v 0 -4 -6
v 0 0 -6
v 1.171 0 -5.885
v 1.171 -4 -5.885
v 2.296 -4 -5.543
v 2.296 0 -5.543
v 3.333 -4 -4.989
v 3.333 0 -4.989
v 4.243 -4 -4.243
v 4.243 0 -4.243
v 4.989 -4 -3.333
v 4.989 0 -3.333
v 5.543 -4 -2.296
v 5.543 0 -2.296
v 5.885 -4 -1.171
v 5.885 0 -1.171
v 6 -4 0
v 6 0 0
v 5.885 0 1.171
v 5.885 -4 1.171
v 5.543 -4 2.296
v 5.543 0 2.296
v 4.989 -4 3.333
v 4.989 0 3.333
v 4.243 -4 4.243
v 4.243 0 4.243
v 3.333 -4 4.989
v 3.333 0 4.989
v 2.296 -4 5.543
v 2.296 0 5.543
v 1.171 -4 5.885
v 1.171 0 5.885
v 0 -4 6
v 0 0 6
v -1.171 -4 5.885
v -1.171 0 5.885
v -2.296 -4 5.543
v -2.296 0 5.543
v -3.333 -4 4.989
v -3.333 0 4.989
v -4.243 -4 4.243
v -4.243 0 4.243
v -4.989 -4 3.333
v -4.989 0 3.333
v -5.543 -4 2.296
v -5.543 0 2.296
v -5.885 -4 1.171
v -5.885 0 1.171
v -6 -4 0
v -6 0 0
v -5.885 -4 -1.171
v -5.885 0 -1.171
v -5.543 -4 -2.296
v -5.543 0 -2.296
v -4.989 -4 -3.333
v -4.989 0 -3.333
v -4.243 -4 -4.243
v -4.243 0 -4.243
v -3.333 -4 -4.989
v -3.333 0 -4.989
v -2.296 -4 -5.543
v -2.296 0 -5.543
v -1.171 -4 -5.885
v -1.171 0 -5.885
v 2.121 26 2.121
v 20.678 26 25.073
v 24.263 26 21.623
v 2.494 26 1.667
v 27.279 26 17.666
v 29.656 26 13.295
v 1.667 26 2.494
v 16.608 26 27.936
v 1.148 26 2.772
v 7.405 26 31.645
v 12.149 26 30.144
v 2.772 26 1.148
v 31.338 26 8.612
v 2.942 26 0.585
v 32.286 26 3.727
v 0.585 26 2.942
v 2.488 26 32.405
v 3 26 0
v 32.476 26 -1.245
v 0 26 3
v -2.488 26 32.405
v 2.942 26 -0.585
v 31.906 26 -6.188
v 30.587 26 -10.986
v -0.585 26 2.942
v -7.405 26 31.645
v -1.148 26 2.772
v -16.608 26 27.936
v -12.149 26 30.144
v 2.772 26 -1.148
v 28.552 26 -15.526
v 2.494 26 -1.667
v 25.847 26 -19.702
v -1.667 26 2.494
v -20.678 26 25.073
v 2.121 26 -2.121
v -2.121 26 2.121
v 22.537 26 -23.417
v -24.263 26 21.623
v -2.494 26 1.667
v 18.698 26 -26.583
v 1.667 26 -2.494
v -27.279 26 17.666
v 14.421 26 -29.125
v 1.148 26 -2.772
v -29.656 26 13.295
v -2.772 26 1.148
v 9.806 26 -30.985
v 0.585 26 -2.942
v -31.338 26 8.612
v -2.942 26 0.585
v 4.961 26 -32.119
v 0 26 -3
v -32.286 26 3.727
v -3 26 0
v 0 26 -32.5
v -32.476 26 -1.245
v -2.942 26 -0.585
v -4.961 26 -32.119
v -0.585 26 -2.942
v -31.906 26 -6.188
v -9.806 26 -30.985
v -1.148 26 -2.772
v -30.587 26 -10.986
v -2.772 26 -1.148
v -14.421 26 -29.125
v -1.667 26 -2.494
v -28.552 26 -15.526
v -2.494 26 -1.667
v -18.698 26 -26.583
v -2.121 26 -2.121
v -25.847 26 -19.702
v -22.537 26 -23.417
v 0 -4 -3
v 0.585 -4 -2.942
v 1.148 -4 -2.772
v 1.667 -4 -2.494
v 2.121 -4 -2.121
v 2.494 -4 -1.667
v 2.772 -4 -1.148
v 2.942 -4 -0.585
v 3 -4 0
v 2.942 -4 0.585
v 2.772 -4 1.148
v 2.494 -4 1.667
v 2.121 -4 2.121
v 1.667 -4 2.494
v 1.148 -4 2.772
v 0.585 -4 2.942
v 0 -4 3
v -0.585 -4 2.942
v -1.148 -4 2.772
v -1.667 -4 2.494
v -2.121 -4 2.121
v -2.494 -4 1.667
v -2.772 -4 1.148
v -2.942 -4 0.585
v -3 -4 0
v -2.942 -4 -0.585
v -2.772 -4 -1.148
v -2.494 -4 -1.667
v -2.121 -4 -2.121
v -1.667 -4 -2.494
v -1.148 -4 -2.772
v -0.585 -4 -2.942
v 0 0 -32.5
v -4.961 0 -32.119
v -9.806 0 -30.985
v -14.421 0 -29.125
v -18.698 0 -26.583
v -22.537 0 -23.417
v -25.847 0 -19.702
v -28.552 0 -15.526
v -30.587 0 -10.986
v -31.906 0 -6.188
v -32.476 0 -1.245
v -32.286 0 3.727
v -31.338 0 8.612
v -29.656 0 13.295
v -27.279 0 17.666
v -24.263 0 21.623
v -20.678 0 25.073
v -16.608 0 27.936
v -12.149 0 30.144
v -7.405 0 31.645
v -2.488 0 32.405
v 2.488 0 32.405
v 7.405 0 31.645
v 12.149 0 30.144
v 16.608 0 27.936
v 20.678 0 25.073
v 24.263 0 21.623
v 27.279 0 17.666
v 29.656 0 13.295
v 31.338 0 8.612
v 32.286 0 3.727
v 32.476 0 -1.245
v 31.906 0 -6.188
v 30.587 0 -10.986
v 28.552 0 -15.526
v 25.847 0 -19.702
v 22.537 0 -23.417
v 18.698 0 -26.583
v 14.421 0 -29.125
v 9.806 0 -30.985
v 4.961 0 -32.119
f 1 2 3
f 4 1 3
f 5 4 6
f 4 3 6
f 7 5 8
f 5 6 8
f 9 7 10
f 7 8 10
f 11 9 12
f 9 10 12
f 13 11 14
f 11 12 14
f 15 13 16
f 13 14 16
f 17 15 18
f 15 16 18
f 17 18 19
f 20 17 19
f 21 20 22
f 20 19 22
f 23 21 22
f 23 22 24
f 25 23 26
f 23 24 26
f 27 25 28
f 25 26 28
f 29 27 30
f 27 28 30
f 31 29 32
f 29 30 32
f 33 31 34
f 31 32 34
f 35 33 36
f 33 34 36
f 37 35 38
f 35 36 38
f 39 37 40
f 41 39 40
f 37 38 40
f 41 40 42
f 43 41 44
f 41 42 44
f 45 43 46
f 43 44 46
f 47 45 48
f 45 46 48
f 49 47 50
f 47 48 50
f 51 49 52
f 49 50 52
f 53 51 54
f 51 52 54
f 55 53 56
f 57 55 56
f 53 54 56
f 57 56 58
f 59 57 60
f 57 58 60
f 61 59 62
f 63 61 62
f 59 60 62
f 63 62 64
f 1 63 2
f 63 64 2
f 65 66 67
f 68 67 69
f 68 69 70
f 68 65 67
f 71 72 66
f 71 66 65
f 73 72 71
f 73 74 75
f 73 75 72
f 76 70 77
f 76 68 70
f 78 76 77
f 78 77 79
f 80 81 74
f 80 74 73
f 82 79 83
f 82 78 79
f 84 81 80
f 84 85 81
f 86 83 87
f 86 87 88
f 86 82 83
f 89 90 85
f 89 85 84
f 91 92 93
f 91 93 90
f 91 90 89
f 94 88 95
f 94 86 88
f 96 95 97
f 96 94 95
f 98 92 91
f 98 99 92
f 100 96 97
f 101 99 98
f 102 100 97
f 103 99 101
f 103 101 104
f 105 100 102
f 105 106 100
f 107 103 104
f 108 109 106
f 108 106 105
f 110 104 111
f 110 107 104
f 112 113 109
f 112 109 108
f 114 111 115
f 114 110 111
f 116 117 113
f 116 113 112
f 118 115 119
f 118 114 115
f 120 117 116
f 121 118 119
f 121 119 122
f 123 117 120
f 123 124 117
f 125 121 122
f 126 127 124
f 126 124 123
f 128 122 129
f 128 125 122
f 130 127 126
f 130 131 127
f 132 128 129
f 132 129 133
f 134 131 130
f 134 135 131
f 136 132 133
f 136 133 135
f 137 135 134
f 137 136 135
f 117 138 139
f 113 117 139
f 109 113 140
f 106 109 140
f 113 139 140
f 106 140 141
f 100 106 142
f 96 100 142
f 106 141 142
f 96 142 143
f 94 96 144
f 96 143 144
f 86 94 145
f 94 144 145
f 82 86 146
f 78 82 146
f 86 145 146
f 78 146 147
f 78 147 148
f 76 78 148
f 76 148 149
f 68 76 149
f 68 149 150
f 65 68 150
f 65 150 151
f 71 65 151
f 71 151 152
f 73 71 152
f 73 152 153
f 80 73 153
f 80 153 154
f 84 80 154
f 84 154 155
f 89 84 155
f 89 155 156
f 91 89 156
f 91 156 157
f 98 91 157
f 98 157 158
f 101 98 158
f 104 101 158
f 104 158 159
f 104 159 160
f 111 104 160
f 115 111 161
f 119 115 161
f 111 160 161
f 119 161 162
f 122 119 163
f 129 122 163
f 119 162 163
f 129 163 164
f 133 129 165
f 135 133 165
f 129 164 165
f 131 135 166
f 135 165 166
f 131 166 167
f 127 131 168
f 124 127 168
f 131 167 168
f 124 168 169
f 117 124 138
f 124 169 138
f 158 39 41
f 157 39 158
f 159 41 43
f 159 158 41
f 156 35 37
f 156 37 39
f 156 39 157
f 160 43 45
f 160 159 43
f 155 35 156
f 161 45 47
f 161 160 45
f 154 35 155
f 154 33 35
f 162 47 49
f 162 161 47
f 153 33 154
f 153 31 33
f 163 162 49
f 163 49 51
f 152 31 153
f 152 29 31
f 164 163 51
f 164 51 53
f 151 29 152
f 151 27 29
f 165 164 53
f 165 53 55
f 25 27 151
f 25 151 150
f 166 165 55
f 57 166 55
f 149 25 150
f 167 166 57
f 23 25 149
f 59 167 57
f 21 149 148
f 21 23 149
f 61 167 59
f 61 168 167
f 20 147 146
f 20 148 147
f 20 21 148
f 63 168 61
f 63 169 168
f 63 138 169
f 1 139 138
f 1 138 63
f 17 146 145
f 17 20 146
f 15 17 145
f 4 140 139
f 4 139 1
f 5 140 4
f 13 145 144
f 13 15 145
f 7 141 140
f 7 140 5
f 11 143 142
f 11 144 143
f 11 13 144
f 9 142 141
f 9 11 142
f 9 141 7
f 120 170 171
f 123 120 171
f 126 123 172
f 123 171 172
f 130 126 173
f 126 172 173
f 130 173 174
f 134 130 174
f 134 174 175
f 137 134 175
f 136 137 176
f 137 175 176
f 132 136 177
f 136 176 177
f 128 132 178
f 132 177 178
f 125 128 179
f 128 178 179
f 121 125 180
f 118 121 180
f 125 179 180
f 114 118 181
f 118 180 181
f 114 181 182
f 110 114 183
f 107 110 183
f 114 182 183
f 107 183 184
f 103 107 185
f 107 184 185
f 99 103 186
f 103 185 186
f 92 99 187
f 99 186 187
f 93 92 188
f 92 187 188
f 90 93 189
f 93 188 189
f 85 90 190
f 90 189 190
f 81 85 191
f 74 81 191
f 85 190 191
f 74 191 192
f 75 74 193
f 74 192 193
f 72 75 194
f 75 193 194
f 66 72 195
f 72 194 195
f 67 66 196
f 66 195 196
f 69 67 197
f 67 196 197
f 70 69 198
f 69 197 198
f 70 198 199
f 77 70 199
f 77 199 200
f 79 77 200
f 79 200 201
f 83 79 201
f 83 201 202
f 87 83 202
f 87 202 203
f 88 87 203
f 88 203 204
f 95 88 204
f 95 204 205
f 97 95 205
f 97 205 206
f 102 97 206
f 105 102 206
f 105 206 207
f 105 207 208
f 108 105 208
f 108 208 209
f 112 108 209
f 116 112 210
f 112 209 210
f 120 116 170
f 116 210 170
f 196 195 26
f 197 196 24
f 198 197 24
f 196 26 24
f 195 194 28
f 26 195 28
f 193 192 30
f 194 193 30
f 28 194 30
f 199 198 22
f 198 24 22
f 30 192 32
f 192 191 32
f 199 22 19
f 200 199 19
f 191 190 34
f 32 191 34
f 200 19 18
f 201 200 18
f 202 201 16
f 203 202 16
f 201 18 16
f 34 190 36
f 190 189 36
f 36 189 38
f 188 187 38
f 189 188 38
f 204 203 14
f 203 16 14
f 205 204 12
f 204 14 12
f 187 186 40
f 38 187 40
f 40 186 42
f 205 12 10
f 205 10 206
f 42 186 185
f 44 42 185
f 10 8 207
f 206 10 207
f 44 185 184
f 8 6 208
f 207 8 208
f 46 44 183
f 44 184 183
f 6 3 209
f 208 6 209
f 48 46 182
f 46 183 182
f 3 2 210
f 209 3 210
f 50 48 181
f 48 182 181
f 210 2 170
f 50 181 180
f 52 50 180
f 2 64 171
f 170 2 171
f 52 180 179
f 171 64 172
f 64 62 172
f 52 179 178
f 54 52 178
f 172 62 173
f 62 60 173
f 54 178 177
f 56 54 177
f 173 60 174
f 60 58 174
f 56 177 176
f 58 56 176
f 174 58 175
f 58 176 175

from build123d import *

# Parameters (mm, degrees)
SKETCH_1_R          = 32.5
EXTRUDE_1_DEPTH     = 26
SKETCH_2_R          = 6
EXTRUDE_2_DEPTH     = 4
SKETCH_3_R          = 3
CUT_EXTRUDE_1_DEPTH = 52


with BuildPart() as part:
    # 草图1 → 凸台-拉伸1 (new body)
    with BuildSketch(Plane(origin=(0, 0, 0), x_dir=(1, 0, 0), z_dir=(0, 1, 0))):
        with Locations(Location((0, 0, 0), (0, 0, 90))):
            Circle(SKETCH_1_R)
    extrude(amount=EXTRUDE_1_DEPTH)

    # 草图2 → 凸台-拉伸2 (add)
    with BuildSketch(Plane.XZ):
        with Locations(Location((0, 0, 0), (0, 0, 270))):
            Circle(SKETCH_2_R)
    extrude(amount=EXTRUDE_2_DEPTH)

    # 草图3 → 切除-拉伸1 (cut)
    with BuildSketch(Plane.XZ.offset(4)):
        with Locations(Location((0, 0, 0), (0, 0, 270))):
            Circle(SKETCH_3_R)
    extrude(amount=-CUT_EXTRUDE_1_DEPTH, mode=Mode.SUBTRACT)


solid = part.part
